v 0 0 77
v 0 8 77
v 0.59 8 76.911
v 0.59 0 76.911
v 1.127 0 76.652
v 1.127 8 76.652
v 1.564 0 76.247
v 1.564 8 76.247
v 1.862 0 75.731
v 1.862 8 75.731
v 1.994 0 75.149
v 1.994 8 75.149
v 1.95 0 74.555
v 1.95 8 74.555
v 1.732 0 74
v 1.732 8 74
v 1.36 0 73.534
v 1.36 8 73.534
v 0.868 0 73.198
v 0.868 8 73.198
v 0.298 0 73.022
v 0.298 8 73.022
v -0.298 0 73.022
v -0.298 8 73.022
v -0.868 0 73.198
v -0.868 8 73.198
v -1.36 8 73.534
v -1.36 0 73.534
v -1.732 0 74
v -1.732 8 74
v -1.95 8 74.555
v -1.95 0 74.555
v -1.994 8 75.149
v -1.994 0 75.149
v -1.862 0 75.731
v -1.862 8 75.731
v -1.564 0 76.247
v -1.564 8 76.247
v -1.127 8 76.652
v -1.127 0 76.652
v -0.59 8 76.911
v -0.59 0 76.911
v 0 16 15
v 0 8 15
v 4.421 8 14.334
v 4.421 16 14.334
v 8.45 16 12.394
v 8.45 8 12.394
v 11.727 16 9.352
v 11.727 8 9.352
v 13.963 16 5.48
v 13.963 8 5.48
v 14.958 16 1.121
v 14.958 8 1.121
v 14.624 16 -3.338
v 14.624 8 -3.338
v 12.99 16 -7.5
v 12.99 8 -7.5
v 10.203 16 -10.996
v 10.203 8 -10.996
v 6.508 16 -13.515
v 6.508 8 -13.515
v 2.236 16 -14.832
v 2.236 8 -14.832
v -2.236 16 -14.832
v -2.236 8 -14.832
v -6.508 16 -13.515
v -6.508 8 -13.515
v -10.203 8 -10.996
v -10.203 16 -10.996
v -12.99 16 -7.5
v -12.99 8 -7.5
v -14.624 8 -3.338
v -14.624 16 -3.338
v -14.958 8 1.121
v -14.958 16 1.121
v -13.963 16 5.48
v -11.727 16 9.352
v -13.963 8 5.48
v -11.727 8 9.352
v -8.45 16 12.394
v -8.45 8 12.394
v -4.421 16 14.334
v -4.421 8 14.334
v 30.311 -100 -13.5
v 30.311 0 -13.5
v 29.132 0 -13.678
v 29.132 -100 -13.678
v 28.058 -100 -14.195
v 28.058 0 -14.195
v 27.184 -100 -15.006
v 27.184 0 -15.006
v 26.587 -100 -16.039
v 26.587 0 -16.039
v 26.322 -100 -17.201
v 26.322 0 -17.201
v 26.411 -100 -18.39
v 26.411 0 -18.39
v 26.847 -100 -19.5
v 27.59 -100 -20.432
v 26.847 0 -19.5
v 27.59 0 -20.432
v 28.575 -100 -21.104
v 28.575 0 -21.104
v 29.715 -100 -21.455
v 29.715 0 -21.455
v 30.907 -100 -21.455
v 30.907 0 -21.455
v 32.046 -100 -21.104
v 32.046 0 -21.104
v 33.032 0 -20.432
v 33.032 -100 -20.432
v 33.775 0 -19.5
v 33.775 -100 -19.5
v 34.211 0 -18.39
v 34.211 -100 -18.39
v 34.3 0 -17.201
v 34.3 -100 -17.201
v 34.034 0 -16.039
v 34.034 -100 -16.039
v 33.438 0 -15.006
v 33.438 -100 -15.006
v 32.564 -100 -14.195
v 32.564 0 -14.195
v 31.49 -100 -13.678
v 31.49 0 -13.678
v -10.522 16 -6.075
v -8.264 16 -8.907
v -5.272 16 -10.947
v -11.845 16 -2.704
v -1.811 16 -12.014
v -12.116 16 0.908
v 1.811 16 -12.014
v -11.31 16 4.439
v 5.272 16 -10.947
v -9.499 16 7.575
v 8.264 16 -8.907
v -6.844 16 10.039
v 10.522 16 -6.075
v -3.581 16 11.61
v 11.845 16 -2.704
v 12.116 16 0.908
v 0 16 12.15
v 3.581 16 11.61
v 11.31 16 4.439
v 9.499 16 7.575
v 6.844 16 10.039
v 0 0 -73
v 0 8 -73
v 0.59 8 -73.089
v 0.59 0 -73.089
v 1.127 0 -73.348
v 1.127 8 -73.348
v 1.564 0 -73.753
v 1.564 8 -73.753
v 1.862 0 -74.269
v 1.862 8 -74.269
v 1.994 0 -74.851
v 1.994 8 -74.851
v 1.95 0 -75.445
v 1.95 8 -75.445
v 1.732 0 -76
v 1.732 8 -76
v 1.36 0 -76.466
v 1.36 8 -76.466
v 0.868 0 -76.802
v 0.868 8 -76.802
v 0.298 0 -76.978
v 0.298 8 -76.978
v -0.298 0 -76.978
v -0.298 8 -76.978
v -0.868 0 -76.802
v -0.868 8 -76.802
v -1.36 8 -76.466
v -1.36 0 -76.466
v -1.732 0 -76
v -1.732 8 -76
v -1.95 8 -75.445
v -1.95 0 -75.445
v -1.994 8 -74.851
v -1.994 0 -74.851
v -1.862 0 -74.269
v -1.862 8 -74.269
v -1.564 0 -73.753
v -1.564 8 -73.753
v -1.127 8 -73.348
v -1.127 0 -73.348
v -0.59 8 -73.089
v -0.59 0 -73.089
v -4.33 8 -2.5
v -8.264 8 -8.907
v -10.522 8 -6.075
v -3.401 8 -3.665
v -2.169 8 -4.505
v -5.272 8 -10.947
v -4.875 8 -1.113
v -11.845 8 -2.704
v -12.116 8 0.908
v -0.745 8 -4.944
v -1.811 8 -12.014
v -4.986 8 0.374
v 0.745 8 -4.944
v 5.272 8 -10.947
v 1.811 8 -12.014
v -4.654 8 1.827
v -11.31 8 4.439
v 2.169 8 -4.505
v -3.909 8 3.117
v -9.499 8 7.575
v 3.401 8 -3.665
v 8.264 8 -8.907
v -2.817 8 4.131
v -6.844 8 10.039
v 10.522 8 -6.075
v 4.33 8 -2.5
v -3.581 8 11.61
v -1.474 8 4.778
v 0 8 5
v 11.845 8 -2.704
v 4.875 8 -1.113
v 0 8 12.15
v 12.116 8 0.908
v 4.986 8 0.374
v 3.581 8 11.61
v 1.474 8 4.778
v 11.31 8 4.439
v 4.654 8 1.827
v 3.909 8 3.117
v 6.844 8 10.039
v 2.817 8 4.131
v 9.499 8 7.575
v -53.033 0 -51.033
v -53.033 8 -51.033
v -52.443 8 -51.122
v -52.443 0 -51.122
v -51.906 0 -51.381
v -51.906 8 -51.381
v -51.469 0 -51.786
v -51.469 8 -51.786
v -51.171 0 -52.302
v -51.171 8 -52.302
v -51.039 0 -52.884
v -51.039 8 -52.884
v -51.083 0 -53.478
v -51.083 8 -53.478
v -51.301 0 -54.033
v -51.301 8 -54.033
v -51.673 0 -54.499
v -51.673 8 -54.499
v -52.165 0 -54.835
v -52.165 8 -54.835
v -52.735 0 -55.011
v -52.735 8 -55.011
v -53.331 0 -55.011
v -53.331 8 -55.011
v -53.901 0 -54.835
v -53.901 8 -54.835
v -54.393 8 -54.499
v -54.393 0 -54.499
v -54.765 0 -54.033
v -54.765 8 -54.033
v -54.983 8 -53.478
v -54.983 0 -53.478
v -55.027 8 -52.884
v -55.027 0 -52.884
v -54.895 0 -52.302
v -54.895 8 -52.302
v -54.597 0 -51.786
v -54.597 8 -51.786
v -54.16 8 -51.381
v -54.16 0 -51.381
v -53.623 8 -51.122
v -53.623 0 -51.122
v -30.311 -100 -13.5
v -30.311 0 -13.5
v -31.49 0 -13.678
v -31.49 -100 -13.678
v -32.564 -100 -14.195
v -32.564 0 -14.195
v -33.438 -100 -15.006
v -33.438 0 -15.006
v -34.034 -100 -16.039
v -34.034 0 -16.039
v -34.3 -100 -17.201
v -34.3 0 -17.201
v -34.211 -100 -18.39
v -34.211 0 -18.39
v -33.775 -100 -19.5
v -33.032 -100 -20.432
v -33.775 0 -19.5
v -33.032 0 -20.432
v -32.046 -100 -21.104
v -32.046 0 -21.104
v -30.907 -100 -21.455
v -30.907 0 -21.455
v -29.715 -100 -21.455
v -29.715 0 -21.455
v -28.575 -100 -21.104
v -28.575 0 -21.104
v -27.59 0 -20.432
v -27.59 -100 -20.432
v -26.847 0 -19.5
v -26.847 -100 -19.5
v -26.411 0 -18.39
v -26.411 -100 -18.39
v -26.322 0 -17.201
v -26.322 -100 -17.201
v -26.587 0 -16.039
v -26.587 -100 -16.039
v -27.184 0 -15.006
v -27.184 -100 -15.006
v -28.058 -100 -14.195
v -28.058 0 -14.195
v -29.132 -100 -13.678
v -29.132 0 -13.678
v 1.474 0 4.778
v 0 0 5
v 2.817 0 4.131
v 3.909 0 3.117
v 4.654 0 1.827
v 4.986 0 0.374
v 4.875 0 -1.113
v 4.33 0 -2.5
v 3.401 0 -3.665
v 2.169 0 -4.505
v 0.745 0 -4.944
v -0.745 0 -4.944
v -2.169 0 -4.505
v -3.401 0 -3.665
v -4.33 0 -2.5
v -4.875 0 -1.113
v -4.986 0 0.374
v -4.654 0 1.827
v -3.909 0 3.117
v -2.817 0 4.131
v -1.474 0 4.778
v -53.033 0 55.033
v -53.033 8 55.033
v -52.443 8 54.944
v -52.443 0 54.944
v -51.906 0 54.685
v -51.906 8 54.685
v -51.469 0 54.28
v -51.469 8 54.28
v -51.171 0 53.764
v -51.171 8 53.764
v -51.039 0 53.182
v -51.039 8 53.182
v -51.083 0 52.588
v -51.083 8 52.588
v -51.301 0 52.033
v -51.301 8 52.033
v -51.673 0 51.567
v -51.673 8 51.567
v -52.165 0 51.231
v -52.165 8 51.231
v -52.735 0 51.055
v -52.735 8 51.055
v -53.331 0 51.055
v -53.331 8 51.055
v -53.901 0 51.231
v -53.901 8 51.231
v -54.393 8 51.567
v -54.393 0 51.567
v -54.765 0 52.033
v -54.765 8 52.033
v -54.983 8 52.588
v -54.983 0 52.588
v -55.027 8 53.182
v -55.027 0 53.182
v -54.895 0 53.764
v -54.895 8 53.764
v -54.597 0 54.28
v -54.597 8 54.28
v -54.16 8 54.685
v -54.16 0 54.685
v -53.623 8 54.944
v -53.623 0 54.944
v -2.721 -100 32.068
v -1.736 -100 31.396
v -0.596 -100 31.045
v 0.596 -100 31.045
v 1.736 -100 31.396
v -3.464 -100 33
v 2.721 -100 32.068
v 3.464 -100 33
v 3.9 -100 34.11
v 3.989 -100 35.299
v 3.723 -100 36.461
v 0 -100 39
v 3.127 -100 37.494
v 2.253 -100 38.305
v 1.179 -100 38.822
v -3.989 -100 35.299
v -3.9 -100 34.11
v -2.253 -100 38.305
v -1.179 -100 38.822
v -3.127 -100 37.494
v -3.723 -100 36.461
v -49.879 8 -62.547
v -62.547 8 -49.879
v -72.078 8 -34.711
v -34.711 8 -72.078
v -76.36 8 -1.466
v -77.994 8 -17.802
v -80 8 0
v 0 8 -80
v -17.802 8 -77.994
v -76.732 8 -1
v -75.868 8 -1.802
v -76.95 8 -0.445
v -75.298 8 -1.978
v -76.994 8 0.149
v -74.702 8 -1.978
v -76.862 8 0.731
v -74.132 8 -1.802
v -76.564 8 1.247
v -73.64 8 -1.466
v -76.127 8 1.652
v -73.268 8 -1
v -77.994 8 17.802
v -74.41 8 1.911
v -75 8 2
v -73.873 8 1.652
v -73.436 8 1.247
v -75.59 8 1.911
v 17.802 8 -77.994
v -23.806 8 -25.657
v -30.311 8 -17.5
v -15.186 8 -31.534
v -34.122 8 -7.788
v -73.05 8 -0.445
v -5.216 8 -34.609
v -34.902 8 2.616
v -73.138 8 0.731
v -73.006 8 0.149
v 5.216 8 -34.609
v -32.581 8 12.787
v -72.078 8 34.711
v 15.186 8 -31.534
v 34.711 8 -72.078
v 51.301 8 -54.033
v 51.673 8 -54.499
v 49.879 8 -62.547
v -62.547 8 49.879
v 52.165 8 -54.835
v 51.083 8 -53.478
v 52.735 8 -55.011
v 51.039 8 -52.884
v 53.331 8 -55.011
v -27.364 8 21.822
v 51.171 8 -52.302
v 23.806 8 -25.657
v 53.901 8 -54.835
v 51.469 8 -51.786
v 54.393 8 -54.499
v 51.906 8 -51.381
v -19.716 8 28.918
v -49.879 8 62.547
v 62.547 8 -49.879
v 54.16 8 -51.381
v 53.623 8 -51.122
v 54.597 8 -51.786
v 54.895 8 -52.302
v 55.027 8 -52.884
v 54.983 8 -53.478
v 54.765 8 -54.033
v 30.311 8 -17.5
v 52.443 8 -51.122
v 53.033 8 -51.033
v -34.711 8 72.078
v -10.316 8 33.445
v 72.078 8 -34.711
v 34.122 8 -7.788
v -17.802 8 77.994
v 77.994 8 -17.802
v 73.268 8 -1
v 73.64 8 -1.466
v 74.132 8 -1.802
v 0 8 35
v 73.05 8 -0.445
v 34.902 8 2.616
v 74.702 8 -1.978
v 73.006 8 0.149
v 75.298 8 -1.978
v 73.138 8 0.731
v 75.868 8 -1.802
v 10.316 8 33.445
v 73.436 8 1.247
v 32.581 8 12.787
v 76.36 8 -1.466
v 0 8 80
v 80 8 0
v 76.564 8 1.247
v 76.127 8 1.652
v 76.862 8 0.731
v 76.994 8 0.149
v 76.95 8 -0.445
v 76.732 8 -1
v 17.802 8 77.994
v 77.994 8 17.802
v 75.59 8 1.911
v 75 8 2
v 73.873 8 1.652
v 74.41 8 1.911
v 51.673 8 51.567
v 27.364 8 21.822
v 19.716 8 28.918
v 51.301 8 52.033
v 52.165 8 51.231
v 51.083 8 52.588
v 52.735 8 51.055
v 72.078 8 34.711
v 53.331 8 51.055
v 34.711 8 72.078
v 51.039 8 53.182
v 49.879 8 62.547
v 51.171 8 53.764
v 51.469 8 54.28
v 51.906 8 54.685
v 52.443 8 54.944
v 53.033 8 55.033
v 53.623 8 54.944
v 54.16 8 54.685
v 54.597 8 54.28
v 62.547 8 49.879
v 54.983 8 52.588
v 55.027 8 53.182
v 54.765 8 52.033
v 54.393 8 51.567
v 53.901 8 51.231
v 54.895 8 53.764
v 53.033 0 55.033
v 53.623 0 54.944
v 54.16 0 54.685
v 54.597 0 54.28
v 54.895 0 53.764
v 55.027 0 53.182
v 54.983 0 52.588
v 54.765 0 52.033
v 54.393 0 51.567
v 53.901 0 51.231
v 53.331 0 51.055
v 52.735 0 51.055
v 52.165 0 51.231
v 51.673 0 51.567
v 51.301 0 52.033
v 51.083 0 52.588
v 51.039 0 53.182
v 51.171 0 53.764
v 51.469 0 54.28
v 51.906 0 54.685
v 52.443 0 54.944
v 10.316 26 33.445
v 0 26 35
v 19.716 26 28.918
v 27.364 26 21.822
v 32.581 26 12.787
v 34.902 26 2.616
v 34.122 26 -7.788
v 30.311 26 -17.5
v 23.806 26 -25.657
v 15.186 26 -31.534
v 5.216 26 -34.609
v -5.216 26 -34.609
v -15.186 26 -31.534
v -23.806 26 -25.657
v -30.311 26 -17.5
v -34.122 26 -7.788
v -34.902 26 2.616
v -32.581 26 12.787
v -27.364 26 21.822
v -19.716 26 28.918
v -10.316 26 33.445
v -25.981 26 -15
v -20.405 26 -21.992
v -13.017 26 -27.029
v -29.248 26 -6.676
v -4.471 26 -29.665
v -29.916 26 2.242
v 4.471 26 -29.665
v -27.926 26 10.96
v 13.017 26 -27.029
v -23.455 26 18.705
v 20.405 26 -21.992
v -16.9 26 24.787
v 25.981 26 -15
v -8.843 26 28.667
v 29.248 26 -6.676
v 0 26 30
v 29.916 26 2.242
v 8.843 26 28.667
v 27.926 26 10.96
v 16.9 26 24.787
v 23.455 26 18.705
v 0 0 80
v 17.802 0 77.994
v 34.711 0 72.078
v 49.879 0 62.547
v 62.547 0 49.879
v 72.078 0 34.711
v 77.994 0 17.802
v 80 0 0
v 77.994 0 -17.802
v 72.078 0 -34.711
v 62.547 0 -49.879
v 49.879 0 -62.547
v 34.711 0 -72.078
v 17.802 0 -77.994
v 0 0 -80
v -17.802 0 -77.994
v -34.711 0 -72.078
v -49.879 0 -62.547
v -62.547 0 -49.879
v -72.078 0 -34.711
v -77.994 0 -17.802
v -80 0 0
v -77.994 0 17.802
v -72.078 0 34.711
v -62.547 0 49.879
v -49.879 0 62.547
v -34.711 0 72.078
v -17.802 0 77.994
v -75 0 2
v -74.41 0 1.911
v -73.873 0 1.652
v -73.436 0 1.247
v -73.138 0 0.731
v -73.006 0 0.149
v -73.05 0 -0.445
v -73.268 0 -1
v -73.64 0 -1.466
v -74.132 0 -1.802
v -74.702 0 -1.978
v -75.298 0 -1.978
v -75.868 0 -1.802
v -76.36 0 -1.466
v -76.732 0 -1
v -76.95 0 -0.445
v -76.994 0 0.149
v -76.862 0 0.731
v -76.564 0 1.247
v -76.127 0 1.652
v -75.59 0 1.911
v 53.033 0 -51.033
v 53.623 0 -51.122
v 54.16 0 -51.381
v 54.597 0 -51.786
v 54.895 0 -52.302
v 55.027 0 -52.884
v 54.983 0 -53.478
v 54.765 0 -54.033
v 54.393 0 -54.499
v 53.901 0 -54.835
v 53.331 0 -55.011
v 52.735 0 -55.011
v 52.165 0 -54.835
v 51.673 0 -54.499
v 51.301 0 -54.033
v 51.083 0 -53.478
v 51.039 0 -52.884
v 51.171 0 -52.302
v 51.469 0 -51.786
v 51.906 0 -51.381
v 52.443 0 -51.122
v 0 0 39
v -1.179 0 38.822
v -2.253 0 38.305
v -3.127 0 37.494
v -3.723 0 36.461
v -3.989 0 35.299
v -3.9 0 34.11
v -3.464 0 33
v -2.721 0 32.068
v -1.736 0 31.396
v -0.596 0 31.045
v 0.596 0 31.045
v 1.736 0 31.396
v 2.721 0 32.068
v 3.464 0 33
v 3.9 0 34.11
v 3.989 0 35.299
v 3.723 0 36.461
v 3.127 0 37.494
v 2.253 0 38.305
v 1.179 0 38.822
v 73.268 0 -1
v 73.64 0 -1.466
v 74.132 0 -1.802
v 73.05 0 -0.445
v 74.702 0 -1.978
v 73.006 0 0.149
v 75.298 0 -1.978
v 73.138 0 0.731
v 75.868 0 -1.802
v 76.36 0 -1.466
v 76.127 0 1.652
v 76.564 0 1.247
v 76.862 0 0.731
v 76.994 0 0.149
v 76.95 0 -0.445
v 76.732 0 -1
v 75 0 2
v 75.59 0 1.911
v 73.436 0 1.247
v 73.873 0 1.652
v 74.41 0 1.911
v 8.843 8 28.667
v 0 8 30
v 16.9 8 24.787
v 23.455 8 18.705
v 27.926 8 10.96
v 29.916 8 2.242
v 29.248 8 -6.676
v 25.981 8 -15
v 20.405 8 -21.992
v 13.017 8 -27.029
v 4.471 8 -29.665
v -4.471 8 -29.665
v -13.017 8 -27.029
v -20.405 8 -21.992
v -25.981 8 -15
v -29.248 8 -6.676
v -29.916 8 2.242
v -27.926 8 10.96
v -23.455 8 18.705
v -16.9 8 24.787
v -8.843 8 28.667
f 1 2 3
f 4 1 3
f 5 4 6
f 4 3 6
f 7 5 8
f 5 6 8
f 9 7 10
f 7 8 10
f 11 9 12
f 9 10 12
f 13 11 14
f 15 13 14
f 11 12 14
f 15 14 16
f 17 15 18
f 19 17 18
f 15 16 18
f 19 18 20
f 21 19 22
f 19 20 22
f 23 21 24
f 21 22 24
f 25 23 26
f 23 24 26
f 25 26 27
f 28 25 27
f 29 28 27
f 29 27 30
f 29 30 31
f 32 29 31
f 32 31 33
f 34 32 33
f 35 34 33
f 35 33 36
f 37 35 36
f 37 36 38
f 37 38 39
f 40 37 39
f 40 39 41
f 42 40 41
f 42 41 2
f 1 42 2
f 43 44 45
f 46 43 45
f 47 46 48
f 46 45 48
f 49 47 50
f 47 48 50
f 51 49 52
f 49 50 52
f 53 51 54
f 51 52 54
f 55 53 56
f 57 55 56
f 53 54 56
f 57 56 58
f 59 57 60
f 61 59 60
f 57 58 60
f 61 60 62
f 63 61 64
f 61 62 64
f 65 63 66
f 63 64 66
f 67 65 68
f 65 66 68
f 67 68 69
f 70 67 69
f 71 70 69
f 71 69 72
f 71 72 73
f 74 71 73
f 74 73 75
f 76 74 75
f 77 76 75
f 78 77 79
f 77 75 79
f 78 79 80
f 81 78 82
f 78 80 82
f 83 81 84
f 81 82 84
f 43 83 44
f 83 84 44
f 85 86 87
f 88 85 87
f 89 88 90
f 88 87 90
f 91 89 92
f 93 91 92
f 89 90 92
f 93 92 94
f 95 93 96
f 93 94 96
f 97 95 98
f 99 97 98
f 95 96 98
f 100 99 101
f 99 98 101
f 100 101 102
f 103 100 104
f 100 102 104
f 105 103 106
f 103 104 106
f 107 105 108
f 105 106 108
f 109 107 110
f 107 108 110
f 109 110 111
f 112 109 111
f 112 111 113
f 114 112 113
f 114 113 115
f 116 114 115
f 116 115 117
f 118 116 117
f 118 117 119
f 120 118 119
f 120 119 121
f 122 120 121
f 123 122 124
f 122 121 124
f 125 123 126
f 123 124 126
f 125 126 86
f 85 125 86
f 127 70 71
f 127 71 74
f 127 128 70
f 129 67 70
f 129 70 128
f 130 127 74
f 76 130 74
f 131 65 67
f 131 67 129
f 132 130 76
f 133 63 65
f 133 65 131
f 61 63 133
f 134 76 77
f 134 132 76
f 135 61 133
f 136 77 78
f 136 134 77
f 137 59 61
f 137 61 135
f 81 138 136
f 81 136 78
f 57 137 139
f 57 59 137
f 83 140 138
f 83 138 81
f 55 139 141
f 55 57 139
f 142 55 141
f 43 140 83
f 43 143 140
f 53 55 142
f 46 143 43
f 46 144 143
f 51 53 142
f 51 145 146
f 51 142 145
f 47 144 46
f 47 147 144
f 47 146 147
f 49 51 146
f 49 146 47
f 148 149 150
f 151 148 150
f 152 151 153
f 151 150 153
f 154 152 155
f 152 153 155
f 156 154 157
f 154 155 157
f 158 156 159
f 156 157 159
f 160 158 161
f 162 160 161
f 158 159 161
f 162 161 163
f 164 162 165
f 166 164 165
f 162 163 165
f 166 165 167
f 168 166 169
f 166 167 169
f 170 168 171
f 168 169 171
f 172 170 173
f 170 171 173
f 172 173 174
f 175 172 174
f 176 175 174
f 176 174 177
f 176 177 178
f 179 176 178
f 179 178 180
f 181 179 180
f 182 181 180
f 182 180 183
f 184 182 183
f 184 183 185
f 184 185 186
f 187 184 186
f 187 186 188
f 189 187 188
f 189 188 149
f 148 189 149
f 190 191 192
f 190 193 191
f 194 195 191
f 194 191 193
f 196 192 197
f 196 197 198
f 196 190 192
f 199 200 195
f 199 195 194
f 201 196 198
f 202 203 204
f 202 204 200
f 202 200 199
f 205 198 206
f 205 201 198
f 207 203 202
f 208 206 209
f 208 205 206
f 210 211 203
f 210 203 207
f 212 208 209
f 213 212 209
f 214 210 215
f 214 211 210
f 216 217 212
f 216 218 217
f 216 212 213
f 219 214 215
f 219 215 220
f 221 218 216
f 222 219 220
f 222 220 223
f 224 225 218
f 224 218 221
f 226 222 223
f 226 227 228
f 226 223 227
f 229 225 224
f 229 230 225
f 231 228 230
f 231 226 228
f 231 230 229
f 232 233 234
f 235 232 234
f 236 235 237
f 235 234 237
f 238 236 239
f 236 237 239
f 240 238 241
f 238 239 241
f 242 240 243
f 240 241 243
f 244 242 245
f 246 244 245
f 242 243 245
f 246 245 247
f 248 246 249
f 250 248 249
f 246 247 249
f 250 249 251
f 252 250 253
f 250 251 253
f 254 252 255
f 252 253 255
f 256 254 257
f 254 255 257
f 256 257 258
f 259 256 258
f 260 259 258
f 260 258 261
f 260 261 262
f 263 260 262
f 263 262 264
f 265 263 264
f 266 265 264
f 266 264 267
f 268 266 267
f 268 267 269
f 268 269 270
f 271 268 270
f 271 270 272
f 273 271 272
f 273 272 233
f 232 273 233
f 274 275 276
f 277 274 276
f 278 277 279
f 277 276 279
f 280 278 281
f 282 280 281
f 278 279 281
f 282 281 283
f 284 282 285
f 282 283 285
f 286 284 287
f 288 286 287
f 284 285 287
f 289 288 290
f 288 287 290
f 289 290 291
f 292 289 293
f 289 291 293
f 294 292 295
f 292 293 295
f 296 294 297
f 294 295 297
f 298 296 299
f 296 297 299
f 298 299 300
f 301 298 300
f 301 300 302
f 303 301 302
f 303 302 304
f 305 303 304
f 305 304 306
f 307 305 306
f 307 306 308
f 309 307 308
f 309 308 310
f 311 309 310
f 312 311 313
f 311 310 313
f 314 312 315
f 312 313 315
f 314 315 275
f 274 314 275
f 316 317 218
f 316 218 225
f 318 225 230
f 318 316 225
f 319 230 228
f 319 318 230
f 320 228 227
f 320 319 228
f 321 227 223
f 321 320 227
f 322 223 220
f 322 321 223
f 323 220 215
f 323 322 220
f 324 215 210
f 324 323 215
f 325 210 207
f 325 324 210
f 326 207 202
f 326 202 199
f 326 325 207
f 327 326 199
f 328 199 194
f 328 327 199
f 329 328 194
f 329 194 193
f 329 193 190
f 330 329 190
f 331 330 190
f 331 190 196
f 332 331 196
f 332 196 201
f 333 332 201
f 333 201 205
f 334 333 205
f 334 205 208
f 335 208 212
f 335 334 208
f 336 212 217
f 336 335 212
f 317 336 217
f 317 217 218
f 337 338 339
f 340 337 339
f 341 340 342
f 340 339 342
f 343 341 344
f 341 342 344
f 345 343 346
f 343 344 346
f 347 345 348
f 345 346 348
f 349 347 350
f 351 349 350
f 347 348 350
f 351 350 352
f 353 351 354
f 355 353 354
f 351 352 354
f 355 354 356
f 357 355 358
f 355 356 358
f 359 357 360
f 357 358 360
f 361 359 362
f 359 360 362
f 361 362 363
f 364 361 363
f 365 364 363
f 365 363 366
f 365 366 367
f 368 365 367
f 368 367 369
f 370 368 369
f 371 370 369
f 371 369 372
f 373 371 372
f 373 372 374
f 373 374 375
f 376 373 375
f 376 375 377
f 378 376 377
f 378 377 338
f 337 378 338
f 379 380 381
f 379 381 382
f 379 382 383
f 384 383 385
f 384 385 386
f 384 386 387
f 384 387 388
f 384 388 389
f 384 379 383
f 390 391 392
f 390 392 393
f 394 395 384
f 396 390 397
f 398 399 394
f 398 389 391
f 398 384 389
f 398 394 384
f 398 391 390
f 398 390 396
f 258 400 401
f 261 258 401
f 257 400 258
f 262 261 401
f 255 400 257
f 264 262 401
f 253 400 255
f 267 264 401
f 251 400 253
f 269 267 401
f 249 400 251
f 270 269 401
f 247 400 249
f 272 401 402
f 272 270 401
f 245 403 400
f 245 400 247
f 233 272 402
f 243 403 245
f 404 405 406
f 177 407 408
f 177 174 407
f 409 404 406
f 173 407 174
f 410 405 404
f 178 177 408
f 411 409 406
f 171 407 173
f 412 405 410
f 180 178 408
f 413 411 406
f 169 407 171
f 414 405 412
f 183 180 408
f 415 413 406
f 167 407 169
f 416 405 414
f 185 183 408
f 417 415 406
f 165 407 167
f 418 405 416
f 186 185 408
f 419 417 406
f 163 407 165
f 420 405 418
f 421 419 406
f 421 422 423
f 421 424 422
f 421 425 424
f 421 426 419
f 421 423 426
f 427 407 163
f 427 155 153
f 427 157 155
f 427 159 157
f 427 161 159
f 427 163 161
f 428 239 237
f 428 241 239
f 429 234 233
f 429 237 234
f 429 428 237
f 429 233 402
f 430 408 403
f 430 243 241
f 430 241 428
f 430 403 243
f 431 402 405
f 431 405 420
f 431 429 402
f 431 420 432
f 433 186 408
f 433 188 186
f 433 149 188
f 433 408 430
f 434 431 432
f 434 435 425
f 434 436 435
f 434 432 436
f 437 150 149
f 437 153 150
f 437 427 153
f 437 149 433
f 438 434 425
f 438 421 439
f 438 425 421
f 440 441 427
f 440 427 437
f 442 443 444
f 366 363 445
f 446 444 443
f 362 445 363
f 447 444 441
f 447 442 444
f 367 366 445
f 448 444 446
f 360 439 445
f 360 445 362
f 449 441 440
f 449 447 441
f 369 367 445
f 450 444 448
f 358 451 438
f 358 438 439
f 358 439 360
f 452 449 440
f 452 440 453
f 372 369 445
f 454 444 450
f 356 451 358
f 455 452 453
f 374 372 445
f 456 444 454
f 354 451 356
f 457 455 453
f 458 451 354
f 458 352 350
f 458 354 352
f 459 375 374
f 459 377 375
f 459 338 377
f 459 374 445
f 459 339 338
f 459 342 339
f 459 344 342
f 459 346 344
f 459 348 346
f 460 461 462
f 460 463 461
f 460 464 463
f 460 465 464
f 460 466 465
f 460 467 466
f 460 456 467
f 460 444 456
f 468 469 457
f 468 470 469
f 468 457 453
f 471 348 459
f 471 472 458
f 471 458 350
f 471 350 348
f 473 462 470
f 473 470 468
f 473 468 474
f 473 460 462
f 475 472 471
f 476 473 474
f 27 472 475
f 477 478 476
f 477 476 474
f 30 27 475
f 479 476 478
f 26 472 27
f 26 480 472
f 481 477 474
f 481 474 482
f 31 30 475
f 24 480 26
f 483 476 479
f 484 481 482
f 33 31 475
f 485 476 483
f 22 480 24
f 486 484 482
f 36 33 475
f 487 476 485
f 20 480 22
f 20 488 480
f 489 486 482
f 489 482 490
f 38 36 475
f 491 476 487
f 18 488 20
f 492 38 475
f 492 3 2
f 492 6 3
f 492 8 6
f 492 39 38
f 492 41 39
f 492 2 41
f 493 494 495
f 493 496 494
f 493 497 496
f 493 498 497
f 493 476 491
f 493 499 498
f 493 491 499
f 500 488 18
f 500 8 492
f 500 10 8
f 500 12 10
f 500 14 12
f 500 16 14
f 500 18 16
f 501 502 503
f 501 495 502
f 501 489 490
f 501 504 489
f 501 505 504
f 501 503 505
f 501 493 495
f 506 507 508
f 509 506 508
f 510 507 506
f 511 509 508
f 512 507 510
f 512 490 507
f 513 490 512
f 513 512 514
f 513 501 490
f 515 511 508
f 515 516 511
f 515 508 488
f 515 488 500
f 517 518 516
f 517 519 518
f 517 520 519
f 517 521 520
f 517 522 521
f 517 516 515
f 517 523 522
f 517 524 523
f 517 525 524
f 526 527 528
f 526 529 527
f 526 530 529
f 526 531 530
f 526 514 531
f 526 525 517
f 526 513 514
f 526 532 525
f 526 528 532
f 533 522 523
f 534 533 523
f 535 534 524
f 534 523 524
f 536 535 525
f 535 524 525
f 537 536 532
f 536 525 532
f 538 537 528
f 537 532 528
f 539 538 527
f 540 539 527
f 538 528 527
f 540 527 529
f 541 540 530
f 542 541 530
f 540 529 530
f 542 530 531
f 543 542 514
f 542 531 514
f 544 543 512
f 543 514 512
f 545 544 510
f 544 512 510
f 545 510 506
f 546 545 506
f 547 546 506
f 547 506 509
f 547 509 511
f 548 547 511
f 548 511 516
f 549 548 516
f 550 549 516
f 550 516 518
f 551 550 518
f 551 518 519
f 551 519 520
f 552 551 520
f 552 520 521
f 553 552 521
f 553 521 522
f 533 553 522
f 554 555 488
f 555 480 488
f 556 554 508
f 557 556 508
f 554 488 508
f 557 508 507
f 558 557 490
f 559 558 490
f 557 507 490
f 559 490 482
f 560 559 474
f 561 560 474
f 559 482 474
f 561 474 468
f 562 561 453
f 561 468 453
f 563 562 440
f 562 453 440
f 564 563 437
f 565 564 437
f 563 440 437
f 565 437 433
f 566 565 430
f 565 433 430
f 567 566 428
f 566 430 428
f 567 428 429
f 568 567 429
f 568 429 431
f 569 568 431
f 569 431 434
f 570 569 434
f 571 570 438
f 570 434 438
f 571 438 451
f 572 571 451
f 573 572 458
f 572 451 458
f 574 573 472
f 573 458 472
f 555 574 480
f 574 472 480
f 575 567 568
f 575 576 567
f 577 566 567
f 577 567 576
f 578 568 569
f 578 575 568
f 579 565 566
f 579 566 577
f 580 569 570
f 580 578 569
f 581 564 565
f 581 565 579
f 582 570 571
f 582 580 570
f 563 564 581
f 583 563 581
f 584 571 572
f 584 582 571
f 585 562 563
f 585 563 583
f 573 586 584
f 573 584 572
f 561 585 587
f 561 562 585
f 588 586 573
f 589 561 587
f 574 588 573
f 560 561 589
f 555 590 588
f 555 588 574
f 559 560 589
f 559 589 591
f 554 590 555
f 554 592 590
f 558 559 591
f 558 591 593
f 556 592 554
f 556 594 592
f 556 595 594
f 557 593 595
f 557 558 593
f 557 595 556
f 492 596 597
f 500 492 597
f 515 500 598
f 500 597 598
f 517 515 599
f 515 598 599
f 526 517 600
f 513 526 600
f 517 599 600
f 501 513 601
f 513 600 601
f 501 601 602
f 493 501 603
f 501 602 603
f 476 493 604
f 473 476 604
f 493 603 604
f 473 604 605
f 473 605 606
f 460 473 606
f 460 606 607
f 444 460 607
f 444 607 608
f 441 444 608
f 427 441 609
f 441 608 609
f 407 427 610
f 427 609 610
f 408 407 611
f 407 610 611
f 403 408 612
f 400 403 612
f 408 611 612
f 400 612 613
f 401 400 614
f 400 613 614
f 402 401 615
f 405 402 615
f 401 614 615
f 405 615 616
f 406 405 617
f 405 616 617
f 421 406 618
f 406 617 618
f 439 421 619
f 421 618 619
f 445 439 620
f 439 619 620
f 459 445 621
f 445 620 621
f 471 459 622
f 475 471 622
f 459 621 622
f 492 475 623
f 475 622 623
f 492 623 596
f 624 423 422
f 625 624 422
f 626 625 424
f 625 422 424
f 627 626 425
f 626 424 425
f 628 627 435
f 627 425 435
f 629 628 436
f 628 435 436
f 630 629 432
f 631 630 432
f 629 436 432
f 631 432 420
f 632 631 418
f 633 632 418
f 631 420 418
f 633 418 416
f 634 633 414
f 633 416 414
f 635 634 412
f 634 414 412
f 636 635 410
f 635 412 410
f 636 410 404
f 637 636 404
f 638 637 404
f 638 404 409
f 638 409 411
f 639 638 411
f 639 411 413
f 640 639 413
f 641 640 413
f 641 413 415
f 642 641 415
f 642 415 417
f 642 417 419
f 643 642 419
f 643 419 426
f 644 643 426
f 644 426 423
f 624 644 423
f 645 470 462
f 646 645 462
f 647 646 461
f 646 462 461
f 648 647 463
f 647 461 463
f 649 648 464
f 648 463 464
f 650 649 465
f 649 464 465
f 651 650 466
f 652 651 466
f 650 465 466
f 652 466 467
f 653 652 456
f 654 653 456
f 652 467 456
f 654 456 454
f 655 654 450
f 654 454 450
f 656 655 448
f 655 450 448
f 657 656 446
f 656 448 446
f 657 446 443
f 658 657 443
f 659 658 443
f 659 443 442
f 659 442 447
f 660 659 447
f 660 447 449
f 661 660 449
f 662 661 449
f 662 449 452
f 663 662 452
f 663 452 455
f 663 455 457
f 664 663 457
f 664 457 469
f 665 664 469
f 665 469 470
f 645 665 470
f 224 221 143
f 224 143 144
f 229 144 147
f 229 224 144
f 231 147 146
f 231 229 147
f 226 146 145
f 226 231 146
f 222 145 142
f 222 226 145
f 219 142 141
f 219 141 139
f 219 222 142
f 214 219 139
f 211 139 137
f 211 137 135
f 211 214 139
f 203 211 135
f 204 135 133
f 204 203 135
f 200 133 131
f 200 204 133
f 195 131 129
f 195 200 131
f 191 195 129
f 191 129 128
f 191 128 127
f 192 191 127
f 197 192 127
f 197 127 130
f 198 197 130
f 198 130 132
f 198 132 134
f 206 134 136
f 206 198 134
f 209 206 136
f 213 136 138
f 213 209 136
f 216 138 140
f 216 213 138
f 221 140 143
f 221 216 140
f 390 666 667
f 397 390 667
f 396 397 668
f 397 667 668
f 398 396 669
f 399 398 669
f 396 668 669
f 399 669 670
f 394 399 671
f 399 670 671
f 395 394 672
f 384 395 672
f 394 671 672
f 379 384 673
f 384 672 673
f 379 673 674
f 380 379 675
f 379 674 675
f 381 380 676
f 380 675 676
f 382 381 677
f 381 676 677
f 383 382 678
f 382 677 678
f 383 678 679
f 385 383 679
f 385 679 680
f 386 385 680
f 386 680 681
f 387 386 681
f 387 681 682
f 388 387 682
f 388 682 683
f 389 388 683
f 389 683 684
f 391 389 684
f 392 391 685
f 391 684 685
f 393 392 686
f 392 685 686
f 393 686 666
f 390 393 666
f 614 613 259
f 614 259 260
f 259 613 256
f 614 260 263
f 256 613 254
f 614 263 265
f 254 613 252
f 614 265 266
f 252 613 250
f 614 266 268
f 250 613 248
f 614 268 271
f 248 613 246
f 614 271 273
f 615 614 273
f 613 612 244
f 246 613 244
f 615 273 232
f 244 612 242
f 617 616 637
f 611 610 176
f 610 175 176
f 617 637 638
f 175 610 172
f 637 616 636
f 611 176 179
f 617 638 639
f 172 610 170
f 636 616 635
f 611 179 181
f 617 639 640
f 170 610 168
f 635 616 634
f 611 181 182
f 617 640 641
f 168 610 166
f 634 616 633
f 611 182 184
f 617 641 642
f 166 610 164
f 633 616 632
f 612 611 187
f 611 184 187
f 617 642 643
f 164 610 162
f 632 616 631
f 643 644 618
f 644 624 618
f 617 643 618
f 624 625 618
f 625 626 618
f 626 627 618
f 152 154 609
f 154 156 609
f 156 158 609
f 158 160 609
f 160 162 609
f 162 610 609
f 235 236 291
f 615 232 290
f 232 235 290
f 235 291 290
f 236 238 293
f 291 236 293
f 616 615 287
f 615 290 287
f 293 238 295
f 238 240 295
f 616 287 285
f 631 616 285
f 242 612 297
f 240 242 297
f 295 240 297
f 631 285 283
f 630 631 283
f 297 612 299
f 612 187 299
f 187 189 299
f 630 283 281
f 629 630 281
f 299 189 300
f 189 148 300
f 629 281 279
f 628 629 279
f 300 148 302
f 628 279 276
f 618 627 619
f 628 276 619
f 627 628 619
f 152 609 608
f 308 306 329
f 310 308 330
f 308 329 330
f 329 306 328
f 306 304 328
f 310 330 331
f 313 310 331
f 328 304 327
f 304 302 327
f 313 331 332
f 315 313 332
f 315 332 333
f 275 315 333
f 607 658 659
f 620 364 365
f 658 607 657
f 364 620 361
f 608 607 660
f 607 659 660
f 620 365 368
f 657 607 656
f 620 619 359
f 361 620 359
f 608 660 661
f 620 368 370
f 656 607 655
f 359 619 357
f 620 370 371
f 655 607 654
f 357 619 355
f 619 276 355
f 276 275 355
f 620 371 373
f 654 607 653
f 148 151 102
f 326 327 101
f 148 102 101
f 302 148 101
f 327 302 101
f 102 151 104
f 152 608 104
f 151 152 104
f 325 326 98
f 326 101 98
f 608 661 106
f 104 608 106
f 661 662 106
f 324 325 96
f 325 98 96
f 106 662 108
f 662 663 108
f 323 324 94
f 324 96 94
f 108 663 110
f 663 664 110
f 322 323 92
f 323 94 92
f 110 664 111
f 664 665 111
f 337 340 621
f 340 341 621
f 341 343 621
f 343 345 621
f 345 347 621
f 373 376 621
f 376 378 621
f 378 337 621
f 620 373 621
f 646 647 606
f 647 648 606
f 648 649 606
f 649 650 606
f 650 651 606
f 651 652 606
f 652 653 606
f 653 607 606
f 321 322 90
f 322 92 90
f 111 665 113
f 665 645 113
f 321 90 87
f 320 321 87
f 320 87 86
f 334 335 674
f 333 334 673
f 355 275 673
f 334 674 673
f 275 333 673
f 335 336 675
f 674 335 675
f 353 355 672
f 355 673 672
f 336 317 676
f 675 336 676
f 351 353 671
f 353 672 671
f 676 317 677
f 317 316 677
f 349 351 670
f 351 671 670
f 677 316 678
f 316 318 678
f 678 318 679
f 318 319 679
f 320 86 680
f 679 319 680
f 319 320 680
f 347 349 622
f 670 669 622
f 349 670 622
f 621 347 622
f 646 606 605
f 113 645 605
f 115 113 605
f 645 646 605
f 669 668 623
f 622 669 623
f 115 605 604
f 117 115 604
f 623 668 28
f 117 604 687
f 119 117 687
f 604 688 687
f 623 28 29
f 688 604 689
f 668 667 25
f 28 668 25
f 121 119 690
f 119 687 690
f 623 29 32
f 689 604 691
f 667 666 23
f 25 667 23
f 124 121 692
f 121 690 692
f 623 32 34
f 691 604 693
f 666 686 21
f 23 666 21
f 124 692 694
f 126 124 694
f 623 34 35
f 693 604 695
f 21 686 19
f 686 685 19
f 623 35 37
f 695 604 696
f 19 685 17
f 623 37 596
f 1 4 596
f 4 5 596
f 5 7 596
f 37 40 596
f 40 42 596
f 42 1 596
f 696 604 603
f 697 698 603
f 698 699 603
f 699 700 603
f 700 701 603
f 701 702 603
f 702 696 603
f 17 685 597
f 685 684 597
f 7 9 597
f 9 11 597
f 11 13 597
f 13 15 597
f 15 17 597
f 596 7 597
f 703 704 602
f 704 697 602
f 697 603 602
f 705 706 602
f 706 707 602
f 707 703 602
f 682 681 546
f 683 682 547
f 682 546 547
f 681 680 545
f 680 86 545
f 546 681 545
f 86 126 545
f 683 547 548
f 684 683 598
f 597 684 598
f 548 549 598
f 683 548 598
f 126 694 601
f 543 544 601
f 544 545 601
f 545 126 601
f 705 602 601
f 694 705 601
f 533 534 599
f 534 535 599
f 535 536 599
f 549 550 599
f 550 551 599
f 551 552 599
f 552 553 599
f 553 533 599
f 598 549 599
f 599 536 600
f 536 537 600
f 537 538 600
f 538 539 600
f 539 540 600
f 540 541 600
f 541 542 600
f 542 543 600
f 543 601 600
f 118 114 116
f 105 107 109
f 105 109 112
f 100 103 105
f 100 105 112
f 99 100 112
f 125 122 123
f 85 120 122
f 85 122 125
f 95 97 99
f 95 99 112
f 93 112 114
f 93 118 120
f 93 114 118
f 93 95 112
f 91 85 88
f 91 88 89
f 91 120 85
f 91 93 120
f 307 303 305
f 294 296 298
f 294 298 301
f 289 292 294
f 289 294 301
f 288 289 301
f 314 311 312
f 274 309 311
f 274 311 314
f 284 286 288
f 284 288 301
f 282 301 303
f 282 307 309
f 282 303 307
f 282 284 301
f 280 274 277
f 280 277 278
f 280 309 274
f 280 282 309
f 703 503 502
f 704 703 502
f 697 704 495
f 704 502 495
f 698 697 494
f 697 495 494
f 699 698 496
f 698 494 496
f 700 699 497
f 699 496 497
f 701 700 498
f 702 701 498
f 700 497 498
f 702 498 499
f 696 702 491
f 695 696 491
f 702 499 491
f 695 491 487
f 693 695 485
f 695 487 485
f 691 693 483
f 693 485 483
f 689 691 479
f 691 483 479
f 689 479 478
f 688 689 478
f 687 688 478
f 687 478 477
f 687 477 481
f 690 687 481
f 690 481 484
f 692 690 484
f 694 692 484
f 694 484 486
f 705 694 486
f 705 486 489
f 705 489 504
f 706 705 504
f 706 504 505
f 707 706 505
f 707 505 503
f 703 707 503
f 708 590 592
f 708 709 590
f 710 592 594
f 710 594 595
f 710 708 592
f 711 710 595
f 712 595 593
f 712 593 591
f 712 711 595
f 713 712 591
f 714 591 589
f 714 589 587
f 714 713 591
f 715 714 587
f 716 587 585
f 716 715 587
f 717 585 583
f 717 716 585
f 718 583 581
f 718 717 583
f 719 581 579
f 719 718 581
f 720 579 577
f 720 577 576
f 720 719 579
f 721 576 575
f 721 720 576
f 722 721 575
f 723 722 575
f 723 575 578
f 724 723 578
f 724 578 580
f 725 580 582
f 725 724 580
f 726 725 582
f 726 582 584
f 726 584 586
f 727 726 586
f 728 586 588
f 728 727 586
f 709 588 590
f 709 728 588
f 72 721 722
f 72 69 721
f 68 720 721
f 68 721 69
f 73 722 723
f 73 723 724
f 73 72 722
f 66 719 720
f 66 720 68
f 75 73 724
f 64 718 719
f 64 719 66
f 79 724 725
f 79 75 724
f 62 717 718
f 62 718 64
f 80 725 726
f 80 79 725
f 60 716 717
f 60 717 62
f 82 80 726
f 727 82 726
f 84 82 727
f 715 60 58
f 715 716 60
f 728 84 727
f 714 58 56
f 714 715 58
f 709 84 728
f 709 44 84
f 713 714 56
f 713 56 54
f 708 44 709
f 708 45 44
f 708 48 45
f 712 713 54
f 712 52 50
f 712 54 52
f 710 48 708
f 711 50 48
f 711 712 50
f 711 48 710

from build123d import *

# Parameters (mm, degrees)
CROQUIS1_R              = 80
CROQUIS1_R_2            = 5
SALIENTE_EXTRUIR1_DEPTH = 8
CROQUIS2_R              = 2
CORTAR_EXTRUIR1_DEPTH   = 10
CROQUIS3_R              = 35
CROQUIS3_R_2            = 30
CROQUIS3_R_3            = 15
CROQUIS3_R_4            = 12.15
SALIENTE_EXTRUIR2_DEPTH = 8
CROQUIS4_R              = 35
CROQUIS4_R_2            = 30
SALIENTE_EXTRUIR3_DEPTH = 10
CROQUIS5_R              = 4
SALIENTE_EXTRUIR4_DEPTH = 100


with BuildPart() as part:
    # Croquis1 → Saliente-Extruir1 (new body)
    with BuildSketch(Plane(origin=(0, 0, 0), x_dir=(1, 0, 0), z_dir=(0, 1, 0))):
        with Locations(Location((0, 0, 0), (0, 0, 270))):
            Circle(CROQUIS1_R)
        with Locations(Location((0, 0, 0), (0, 0, 270))):
            Circle(CROQUIS1_R_2, mode=Mode.SUBTRACT)
    extrude(amount=SALIENTE_EXTRUIR1_DEPTH)

    # Croquis2 → Cortar-Extruir1 (cut)
    with BuildSketch(Plane(origin=(0, 8, 0), x_dir=(1, 0, 0), z_dir=(0, 1, 0))):
        with Locations(Location((0, 75, 0), (0, 0, 270))):
            Circle(CROQUIS2_R)
        with Locations(Location((53.033008589, 53.033008589, 0), (0, 0, 270))):
            Circle(CROQUIS2_R)
        with Locations(Location((75, 0, 0), (0, 0, 270))):
            Circle(CROQUIS2_R)
        with Locations(Location((53.033008589, -53.033008589, 0), (0, 0, 270))):
            Circle(CROQUIS2_R)
        with Locations(Location((0, -75, 0), (0, 0, 270))):
            Circle(CROQUIS2_R)
        with Locations(Location((-53.033008589, -53.033008589, 0), (0, 0, 270))):
            Circle(CROQUIS2_R)
        with Locations(Location((-75, 0, 0), (0, 0, 270))):
            Circle(CROQUIS2_R)
        with Locations(Location((-53.033008589, 53.033008589, 0), (0, 0, 270))):
            Circle(CROQUIS2_R)
    extrude(amount=-CORTAR_EXTRUIR1_DEPTH, mode=Mode.SUBTRACT)

    # Croquis3 → Saliente-Extruir2 (add)
    # profile 1 of 2: a face of its own
    with BuildSketch(Plane(origin=(0, 8, 0), x_dir=(1, 0, 0), z_dir=(0, 1, 0))):
        with Locations(Location((0, 0, 0), (0, 0, 270))):
            Circle(CROQUIS3_R)
        with Locations(Location((0, 0, 0), (0, 0, 270))):
            Circle(CROQUIS3_R_2, mode=Mode.SUBTRACT)
    # profile 2 of 2: a face of its own
    with BuildSketch(Plane(origin=(0, 8, 0), x_dir=(1, 0, 0), z_dir=(0, 1, 0))):
        with Locations(Location((0, 0, 0), (0, 0, 270))):
            Circle(CROQUIS3_R_3)
        with Locations(Location((0, 0, 0), (0, 0, 270))):
            Circle(CROQUIS3_R_4, mode=Mode.SUBTRACT)
    extrude(amount=SALIENTE_EXTRUIR2_DEPTH)

    # Croquis4 → Saliente-Extruir3 (add)
    with BuildSketch(Plane(origin=(0, 16, 0), x_dir=(1, 0, 0), z_dir=(0, 1, 0))):
        with Locations(Location((0, 0, 0), (0, 0, 270))):
            Circle(CROQUIS4_R)
        with Locations(Location((0, 0, 0), (0, 0, 270))):
            Circle(CROQUIS4_R_2, mode=Mode.SUBTRACT)
    extrude(amount=SALIENTE_EXTRUIR3_DEPTH)

    # Croquis5 → Saliente-Extruir4 (add)
    with BuildSketch(Plane.XZ):
        with Locations(Location((0, 35, 0), (0, 0, 90))):
            Circle(CROQUIS5_R)
        with Locations(Location((30.310889132, -17.5, 0), (0, 0, 90))):
            Circle(CROQUIS5_R)
        with Locations(Location((-30.310889132, -17.5, 0), (0, 0, 90))):
            Circle(CROQUIS5_R)
    extrude(amount=SALIENTE_EXTRUIR4_DEPTH)


solid = part.part
